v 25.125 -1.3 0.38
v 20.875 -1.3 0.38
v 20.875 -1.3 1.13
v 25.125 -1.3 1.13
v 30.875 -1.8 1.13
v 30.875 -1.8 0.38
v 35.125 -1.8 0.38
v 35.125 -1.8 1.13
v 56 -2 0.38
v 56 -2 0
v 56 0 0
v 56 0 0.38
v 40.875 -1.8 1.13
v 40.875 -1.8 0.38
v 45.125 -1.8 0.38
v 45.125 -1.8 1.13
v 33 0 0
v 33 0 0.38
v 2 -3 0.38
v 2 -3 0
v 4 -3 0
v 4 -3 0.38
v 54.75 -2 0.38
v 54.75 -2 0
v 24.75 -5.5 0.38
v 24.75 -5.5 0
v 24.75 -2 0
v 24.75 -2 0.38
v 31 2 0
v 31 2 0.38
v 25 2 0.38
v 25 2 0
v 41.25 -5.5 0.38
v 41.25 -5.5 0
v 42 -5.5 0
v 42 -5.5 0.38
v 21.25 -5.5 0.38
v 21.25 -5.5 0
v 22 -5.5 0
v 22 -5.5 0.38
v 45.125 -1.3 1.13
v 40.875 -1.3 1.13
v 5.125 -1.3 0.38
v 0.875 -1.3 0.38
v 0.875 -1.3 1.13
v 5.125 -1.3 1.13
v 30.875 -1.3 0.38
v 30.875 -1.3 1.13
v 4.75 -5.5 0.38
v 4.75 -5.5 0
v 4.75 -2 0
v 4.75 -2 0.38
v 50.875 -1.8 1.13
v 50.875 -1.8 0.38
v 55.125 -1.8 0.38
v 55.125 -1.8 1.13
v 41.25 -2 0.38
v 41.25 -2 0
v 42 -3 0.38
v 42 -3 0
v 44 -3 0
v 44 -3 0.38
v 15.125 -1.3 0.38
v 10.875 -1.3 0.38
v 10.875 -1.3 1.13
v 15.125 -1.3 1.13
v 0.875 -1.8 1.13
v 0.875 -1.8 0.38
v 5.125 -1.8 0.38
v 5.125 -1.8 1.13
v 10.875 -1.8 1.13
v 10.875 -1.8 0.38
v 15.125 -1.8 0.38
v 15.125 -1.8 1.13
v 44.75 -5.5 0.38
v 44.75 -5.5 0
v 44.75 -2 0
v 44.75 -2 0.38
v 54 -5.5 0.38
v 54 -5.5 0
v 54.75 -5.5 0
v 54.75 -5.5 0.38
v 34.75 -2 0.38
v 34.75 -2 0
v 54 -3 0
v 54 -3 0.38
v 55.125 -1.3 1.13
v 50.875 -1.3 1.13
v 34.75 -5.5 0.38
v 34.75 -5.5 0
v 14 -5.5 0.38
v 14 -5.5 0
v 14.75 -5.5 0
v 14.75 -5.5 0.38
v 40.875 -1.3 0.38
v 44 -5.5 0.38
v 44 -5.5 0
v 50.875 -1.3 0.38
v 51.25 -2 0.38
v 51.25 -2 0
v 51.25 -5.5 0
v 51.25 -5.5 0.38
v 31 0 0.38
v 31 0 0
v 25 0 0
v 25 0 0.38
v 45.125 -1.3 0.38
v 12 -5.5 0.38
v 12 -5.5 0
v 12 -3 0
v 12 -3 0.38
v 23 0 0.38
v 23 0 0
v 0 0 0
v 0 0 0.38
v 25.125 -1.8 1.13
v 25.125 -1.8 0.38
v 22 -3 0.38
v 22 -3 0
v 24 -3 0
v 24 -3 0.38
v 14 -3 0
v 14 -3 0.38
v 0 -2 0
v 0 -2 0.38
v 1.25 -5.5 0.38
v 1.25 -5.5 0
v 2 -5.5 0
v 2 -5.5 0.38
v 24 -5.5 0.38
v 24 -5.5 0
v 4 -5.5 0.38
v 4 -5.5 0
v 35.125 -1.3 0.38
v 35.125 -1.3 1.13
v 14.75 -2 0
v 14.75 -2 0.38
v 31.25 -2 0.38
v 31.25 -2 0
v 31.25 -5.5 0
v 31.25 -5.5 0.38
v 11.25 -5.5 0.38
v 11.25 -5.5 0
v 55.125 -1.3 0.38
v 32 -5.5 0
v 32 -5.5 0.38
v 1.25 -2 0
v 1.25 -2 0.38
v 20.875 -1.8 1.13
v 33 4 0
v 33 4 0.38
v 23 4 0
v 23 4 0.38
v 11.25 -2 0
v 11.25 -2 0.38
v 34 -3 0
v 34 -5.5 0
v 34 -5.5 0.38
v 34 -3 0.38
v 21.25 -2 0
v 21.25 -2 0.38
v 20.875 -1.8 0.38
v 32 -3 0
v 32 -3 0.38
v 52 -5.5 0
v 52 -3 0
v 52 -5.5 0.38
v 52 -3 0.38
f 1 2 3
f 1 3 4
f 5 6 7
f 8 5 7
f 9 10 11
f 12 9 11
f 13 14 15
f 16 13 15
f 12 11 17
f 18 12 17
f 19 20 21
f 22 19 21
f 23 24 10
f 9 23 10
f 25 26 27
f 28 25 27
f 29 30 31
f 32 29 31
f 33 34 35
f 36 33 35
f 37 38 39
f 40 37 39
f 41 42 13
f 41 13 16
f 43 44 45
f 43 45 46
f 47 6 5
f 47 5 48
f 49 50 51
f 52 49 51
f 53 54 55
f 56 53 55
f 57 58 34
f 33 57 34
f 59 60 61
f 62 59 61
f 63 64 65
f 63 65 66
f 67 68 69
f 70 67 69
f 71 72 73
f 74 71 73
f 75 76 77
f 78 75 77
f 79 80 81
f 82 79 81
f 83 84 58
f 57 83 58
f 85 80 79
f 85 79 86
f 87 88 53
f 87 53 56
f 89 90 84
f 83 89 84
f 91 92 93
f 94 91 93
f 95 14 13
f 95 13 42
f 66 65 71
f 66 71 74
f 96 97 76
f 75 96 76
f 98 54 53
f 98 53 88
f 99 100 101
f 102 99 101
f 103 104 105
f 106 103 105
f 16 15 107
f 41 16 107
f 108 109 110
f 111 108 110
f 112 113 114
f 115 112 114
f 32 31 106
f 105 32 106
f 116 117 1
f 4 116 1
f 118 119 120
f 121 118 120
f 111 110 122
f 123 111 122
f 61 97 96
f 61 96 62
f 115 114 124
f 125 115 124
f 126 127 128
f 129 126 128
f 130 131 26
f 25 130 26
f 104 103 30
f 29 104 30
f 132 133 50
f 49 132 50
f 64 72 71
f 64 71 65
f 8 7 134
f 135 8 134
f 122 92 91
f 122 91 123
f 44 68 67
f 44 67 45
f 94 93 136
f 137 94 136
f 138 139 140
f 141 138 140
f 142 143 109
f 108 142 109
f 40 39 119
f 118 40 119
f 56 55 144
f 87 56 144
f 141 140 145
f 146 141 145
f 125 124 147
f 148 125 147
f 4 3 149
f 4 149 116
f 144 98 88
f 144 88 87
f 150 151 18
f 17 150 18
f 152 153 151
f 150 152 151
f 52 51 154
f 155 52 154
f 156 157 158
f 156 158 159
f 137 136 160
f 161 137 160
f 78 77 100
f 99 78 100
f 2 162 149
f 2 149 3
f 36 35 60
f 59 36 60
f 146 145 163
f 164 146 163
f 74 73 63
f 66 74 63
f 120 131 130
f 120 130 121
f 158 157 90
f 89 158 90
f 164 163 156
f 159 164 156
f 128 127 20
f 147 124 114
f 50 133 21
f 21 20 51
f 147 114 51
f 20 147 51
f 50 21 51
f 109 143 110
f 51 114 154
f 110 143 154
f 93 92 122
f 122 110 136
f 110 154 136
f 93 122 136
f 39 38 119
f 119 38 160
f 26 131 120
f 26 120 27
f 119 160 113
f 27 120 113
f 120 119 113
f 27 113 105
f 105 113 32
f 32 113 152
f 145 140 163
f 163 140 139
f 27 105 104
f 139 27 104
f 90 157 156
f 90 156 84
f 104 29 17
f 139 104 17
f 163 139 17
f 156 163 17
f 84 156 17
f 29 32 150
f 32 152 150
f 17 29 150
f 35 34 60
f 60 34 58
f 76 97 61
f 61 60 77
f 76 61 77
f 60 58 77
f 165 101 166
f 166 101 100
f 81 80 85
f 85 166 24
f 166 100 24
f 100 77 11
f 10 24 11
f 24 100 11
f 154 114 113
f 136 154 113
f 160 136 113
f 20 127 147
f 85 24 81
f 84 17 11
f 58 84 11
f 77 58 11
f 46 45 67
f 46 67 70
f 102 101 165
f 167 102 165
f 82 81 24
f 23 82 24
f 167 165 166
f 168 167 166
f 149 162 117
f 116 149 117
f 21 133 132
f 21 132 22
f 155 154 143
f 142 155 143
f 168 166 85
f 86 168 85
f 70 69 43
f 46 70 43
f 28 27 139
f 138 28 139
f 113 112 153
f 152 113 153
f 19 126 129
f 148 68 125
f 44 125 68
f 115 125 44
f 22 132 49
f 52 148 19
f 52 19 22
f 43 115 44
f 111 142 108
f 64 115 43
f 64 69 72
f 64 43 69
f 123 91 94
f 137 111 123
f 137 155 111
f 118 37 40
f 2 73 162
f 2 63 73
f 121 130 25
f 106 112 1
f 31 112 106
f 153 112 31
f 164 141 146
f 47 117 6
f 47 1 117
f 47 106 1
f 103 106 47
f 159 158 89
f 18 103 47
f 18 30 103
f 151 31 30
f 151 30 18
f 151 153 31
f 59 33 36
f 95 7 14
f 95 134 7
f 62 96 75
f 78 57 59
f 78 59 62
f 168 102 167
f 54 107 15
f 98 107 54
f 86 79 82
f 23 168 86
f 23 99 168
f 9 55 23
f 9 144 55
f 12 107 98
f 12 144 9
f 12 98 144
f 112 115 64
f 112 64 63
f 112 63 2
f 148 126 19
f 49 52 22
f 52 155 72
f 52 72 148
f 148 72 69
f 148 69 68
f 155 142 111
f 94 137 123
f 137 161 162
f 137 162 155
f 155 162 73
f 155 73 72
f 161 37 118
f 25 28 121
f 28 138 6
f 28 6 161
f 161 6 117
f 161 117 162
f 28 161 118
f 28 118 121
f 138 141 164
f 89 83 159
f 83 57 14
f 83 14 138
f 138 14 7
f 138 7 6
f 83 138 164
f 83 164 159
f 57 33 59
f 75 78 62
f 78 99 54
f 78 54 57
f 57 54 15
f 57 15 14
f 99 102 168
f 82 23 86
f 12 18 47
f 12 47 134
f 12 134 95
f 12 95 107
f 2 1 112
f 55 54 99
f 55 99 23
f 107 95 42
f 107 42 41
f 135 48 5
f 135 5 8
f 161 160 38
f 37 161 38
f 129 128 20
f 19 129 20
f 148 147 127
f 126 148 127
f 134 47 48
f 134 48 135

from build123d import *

# Parameters (mm, degrees)
BOSS_EXTRUDE1_DEPTH     = 0.38
BOSS_EXTRUDE2_DEPTH     = 0.38
SKETCH3_W               = 4.25
SKETCH3_H               = 0.5
BOSS_EXTRUDE3_DEPTH     = 0.75
LPATTERN1_COUNT         = 6
LPATTERN1_PITCH         = 10
CUT_EXTRUDE1_DEPTH      = 57.274439135
CUT_EXTRUDE1_DEPTH_BACK = 57.274439135
SKETCH4_W               = 2
SKETCH4_H               = 2.5


with BuildPart() as part:
    # Sketch1 → Boss-Extrude1 (new body)
    with BuildSketch(Plane.XY):
        Polygon((0, 0), (0, -2), (1.25, -2), (1.25, -5.5), (4.75, -5.5), (4.75, -2), (11.25, -2), (11.25, -5.5), (14.75, -5.5), (14.75, -2), (21.25, -2), (21.25, -5.5), (24.75, -5.5), (24.75, -2), (31.25, -2), (31.25, -5.5), (34.75, -5.5), (34.75, -2), (41.25, -2), (41.25, -5.5), (44.75, -5.5), (44.75, -2), (51.25, -2), (51.25, -5.5), (54.75, -5.5), (54.75, -2), (56, -2), (56, 0), align=None)
    extrude(amount=BOSS_EXTRUDE1_DEPTH)

    # Sketch2 → Boss-Extrude2 (add)
    with BuildSketch(Plane.XY.offset(0.38)):
        Polygon((23, 0), (23, 4), (33, 4), (33, 0), (31, 0), (31, 2), (25, 2), (25, 0), align=None)
    extrude(amount=-BOSS_EXTRUDE2_DEPTH)

    # Sketch3 → Boss-Extrude3 (add)
    with BuildSketch(Plane.XY.offset(0.38)):
        with Locations((3, -1.55)):
            Rectangle(SKETCH3_W, SKETCH3_H)
    boss_extrude3 = extrude(amount=BOSS_EXTRUDE3_DEPTH)

    # LPattern1: Boss-Extrude3 ×6
    with Locations(*[(i * LPATTERN1_PITCH, 0, 0) for i in range(1, LPATTERN1_COUNT)]):
        add(boss_extrude3)

    # Sketch4 → Cut-Extrude1 (cut, two sides: drawn at the far end of the back side and taken through both)
    with BuildSketch(Plane.XY.offset(0.38).offset(-CUT_EXTRUDE1_DEPTH_BACK)):
        with Locations((3, -4.25)):
            Rectangle(SKETCH4_W, SKETCH4_H)
        with Locations((13, -4.25)):
            Rectangle(SKETCH4_W, SKETCH4_H)
        with Locations((23, -4.25)):
            Rectangle(SKETCH4_W, SKETCH4_H)
        with Locations((33, -4.25)):
            Rectangle(SKETCH4_W, SKETCH4_H)
        with Locations((43, -4.25)):
            Rectangle(SKETCH4_W, SKETCH4_H)
        with Locations((53, -4.25)):
            Rectangle(SKETCH4_W, SKETCH4_H)
    extrude(amount=CUT_EXTRUDE1_DEPTH + CUT_EXTRUDE1_DEPTH_BACK, mode=Mode.SUBTRACT)


solid = part.part
